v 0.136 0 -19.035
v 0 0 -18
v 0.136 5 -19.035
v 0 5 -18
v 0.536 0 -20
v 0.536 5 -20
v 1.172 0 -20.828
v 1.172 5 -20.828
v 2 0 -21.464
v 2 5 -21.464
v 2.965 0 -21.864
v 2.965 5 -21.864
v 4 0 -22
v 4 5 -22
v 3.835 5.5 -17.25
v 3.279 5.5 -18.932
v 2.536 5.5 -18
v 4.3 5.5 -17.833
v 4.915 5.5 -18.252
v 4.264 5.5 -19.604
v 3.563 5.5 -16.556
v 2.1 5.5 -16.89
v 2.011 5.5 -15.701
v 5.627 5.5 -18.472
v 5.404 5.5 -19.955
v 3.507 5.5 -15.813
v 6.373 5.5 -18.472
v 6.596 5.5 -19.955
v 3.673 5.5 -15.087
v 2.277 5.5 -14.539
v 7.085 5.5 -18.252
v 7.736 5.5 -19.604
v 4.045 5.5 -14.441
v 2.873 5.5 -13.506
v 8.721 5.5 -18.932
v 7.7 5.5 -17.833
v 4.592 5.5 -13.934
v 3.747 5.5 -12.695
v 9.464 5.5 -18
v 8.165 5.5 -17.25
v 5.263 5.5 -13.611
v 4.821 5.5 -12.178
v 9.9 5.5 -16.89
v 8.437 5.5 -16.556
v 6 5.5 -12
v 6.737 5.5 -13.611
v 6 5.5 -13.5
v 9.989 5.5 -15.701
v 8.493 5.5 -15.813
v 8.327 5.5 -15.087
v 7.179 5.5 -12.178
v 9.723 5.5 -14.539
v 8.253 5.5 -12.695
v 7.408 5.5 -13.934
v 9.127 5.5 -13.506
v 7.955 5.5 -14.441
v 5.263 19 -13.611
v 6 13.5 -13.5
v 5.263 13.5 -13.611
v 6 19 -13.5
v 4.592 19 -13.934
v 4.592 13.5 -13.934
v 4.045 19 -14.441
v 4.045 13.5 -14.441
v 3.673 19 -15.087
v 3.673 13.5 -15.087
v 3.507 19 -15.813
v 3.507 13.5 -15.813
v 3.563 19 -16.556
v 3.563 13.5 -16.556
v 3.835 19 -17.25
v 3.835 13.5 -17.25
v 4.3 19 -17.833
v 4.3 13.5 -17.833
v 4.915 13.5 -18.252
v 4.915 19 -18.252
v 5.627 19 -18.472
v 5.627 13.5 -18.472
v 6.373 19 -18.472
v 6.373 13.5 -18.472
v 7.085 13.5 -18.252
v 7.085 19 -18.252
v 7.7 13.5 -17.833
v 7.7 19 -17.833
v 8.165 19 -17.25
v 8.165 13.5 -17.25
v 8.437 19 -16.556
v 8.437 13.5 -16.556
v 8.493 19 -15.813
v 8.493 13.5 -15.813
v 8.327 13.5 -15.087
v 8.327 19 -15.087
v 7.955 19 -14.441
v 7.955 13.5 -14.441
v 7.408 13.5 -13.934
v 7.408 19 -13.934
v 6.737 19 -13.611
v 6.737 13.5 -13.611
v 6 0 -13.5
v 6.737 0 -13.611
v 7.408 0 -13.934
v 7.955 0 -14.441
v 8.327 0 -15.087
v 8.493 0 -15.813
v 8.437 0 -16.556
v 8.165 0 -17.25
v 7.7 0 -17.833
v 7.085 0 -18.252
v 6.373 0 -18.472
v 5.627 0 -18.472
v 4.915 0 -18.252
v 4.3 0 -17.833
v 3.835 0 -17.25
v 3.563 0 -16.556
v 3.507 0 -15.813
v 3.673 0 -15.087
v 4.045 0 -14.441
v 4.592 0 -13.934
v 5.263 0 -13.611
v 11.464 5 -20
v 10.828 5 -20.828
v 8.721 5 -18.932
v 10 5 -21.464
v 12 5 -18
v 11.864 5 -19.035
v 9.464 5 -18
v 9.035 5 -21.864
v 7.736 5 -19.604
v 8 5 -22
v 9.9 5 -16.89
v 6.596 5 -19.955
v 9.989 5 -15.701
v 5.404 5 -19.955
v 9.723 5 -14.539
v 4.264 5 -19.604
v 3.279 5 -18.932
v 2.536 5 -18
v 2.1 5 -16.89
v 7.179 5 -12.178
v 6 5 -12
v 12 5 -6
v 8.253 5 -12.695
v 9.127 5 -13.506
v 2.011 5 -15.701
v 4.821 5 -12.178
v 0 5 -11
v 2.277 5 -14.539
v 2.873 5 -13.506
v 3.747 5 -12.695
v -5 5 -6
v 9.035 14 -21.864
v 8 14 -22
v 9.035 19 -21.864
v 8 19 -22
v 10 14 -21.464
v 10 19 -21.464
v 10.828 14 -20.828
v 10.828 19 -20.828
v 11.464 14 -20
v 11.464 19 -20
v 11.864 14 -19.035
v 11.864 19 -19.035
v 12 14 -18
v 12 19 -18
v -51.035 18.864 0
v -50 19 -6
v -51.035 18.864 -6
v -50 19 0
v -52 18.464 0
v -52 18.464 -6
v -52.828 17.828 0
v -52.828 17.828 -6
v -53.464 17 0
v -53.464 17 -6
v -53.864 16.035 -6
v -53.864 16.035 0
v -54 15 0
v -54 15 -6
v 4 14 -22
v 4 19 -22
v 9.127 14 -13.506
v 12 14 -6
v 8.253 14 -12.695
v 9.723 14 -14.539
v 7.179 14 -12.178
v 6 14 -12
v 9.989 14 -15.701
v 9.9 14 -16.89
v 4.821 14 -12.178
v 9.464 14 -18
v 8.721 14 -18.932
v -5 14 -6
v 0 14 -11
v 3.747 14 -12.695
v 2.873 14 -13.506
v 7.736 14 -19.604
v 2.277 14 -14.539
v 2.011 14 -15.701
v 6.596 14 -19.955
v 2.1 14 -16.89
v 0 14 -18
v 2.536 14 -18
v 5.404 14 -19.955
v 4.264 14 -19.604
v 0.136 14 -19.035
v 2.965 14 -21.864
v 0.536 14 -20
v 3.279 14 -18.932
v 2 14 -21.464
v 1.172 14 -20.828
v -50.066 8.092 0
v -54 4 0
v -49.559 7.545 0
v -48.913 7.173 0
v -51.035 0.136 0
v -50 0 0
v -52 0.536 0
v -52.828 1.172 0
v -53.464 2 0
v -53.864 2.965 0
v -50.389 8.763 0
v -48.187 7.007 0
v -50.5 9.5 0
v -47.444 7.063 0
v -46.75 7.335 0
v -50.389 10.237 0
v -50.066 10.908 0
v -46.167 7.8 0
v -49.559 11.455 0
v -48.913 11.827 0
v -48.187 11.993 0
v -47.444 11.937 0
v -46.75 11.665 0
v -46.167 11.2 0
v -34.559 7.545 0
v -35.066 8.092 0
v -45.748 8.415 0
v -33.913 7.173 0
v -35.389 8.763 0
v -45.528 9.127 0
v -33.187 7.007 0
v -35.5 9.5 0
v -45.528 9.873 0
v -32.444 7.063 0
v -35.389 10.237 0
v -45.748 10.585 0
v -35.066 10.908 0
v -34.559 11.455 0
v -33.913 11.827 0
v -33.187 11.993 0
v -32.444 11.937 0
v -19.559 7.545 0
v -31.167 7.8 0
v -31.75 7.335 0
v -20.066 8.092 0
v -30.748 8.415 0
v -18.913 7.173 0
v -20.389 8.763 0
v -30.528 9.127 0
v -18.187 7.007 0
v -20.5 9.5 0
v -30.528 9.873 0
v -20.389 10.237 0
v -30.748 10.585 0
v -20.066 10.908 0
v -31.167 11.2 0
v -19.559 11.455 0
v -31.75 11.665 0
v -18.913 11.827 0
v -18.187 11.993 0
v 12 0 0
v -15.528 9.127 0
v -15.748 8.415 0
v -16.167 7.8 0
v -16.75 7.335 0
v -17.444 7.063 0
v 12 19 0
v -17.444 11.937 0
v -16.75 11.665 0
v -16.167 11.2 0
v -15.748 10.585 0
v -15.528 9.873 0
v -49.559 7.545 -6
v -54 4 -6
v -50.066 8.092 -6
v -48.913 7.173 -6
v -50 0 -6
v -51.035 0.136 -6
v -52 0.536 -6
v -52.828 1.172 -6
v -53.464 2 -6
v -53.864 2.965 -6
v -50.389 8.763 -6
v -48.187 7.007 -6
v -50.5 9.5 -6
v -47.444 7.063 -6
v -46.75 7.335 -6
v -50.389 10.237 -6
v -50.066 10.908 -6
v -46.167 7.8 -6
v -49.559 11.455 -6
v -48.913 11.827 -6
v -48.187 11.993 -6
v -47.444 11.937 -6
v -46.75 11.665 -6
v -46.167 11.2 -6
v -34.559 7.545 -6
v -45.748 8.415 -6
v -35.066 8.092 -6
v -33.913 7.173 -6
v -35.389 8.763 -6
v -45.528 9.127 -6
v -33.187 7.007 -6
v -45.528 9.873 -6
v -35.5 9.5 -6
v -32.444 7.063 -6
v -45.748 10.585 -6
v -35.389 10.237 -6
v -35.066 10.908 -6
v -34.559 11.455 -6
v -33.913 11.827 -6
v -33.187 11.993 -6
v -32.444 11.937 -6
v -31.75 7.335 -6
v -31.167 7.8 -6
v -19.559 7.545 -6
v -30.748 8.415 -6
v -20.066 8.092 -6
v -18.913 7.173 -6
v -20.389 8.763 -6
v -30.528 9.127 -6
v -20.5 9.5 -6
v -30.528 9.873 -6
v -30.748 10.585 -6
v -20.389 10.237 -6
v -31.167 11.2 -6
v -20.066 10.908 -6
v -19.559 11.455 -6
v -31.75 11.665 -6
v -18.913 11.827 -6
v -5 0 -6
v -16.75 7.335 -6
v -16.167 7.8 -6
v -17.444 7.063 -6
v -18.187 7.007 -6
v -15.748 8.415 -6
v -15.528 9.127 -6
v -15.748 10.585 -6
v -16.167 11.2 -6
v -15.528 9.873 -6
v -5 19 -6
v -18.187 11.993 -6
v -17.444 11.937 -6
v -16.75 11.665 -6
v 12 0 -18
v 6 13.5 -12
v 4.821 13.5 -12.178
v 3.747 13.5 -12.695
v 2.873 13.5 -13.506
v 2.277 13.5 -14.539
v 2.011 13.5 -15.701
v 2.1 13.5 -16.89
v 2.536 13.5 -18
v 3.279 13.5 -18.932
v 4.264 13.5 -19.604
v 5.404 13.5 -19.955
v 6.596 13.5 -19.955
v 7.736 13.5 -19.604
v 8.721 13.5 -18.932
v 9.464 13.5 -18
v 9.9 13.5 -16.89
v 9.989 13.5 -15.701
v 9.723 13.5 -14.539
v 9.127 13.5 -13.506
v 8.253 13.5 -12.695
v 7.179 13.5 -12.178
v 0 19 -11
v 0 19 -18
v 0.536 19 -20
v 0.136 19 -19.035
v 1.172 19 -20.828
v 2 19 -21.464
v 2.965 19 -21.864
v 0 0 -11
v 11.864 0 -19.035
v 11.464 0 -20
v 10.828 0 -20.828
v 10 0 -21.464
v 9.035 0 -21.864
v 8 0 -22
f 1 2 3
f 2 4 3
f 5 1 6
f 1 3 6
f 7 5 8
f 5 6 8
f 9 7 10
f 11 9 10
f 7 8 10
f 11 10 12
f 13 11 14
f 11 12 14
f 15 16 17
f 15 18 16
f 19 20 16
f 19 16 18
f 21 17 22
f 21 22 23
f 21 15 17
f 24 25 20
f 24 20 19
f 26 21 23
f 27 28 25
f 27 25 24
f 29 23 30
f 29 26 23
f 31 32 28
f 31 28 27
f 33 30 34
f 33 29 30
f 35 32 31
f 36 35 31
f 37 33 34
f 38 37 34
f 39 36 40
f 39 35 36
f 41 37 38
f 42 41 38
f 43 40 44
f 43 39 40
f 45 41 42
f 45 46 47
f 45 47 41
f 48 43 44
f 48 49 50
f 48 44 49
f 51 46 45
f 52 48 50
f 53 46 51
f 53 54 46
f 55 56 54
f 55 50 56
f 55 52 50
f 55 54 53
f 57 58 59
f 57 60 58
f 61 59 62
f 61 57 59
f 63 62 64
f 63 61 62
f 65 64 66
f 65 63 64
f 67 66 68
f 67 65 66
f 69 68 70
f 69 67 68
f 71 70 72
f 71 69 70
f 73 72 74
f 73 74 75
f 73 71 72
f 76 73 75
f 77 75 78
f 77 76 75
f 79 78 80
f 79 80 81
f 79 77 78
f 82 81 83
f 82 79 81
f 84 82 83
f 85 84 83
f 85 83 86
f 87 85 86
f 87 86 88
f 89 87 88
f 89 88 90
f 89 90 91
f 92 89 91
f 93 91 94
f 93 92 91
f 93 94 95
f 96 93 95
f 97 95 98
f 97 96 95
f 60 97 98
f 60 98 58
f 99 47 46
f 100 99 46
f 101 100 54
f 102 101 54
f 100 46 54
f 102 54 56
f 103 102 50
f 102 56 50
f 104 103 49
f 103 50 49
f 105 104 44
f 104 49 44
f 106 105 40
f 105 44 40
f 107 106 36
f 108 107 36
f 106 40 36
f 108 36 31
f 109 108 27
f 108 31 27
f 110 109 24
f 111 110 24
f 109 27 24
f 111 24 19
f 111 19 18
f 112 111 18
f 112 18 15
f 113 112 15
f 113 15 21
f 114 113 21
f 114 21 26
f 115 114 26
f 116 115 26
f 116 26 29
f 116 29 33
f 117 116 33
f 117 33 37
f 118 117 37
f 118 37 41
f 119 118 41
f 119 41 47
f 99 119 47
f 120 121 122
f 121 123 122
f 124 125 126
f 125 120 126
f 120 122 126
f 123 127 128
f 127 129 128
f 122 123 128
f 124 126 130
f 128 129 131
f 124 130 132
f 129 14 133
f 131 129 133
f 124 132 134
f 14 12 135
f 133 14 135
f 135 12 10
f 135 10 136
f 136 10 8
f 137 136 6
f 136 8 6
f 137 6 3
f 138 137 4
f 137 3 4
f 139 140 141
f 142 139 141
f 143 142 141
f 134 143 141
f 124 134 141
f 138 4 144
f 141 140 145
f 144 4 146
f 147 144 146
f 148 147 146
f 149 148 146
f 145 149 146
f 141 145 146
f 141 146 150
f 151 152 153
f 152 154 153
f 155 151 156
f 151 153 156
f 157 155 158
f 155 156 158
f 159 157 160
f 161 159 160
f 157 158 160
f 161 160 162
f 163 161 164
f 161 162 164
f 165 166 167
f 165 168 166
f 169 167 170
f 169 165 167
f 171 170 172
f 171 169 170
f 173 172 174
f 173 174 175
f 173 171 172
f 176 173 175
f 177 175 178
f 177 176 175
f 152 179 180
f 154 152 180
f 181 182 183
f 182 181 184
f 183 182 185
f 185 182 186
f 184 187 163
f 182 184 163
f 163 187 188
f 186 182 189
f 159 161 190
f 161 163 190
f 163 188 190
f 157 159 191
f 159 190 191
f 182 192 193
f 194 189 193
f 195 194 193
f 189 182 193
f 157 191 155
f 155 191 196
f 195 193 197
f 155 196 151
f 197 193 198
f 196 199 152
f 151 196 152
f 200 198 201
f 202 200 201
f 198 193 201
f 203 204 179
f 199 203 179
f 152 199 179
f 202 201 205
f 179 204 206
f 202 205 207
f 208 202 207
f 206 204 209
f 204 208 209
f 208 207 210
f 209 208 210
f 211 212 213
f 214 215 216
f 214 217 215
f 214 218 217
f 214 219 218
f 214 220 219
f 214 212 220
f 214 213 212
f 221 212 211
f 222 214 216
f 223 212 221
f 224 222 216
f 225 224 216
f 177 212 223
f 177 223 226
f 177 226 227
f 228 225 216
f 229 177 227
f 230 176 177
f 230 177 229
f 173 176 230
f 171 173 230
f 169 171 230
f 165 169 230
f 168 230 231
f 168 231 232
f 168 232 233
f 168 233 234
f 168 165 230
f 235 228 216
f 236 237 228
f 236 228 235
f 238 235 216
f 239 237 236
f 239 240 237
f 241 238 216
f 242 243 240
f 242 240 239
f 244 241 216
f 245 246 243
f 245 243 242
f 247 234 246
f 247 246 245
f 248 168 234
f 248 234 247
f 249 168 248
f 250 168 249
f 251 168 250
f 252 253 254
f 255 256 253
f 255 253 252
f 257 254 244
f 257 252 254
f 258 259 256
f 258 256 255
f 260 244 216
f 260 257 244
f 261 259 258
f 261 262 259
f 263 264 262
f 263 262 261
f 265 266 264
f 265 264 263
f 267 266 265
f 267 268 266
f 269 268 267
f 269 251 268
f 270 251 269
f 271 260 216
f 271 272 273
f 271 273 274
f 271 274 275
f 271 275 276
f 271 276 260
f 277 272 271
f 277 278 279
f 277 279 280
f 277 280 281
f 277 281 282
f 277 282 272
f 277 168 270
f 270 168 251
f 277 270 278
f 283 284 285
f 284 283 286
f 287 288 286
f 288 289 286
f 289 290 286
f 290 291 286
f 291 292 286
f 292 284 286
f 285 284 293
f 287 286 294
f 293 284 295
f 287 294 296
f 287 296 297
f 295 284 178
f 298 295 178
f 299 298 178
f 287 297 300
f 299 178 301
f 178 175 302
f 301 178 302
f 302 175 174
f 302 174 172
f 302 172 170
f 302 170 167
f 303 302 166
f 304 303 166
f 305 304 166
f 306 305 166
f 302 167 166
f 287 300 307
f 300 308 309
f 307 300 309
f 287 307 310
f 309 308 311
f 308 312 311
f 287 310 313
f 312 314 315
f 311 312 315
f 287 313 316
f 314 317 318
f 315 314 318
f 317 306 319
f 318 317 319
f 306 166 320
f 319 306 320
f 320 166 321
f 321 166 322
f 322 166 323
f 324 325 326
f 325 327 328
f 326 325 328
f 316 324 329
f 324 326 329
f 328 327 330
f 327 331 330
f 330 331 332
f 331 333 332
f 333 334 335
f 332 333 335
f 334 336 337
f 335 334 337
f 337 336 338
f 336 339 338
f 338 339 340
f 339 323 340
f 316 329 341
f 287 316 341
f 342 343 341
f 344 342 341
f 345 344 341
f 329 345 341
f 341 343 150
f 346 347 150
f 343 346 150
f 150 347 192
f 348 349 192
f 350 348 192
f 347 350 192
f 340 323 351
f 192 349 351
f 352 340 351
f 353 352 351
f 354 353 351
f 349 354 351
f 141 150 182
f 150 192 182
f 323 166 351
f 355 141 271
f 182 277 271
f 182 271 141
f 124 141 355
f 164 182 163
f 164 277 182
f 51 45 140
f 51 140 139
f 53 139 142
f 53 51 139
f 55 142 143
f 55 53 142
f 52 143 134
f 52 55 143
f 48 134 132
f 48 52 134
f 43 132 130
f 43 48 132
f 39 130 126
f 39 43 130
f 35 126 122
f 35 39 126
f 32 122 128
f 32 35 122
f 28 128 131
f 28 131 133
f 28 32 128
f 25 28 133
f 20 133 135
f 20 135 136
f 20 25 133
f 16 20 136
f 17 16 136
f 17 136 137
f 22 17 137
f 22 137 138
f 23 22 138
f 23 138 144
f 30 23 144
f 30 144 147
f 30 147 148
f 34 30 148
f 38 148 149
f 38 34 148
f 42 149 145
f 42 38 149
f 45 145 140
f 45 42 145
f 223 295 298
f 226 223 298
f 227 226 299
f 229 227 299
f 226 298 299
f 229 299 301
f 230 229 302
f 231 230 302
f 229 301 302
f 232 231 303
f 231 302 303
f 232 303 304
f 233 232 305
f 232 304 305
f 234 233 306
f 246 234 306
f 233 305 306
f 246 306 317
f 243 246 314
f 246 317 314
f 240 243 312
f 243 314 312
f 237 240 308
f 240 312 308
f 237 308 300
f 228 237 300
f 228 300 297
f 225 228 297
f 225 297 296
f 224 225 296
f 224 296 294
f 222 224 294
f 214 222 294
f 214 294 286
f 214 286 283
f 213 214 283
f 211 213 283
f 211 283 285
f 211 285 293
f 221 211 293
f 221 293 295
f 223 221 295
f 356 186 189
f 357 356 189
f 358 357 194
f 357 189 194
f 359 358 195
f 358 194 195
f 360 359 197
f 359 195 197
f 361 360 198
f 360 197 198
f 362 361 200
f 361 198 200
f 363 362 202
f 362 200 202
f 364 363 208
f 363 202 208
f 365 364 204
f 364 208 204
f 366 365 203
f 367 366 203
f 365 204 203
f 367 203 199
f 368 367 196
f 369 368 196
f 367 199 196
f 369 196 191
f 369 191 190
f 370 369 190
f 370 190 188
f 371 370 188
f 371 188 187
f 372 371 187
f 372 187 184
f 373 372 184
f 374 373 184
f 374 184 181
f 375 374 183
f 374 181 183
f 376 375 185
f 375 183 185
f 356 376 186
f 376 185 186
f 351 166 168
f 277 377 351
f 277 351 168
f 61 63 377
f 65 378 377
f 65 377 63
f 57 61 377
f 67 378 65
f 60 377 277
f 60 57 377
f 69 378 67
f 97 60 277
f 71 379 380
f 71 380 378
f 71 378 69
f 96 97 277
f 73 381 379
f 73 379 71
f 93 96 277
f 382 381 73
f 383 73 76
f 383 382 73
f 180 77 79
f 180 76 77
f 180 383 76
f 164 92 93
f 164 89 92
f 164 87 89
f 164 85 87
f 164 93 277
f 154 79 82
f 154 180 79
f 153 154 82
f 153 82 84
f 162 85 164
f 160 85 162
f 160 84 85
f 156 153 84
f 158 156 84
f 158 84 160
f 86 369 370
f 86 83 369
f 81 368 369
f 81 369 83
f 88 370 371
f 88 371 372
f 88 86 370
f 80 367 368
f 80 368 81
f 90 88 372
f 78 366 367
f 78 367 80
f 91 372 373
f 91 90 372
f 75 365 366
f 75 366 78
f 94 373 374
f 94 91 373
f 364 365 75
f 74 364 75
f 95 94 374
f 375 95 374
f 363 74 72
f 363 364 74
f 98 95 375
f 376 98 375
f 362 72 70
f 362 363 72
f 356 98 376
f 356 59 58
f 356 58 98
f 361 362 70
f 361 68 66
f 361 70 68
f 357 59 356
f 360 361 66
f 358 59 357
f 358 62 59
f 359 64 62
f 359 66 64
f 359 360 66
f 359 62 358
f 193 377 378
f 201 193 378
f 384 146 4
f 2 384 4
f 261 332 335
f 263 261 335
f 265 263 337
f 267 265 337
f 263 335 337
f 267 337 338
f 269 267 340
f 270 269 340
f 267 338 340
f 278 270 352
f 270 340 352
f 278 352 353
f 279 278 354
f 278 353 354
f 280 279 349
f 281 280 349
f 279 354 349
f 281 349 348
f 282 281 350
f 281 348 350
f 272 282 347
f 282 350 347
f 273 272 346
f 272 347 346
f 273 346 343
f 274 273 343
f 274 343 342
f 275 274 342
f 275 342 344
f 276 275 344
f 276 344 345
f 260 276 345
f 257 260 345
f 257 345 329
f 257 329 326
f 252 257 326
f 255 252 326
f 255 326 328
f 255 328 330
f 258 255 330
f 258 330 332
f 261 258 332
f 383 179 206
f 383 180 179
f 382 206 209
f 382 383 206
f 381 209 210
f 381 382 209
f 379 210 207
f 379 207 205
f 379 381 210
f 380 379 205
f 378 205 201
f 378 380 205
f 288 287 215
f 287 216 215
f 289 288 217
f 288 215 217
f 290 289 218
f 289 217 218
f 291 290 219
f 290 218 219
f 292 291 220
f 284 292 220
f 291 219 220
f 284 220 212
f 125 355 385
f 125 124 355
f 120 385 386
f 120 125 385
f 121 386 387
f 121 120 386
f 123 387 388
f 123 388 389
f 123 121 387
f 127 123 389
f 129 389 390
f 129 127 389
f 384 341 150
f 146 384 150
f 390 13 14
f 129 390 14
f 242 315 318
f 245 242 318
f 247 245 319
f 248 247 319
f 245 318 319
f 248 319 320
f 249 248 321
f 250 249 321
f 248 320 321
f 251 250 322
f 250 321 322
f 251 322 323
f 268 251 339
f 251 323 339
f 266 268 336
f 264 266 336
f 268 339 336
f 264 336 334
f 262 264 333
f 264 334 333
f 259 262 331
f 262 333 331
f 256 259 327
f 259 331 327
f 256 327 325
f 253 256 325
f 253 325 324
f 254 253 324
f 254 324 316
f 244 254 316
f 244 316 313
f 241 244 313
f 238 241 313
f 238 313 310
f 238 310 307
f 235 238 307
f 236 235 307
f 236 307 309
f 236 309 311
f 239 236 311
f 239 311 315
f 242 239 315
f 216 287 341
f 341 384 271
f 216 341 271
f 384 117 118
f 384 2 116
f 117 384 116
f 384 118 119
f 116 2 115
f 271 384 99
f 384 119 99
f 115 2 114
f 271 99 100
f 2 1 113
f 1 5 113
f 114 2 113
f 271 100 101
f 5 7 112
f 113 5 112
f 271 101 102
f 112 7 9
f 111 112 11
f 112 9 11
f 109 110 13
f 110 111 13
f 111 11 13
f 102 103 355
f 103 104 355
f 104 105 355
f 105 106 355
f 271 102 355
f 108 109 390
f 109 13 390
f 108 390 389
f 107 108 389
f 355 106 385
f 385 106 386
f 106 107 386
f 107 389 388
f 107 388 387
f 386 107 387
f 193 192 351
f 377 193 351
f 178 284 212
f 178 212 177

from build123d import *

# Parameters (mm, degrees)
EXTRUDE_1_DEPTH     = 12
SKETCH_2_R          = 2.5
CUT_EXTRUDE_1_DEPTH = 32.448370387
SKETCH_3_R          = 4
SKETCH_3_R_2        = 2.5
EXTRUDE_2_DEPTH     = 0.5
EXTRUDE_START       = 0.5
SKETCH_4_R          = 4
SKETCH_4_R_2        = 2.5
EXTRUDE_3_DEPTH     = 0.5
FILLET_1_R          = 4
EXTRUDE_START_2     = -6
SKETCH_5_W          = 54
SKETCH_5_H          = 19
EXTRUDE_4_DEPTH     = 6
CHAMFER_1_SIZE      = 5
SKETCH_6_R          = 2.5
CUT_EXTRUDE_2_DEPTH = 60.439044407
FILLET_2_R          = 4


with BuildPart() as part:
    # Эскиз1 → Бобышка-Вытянуть1 (new body)
    with BuildSketch(Plane(origin=(0, 0, 0), x_dir=(0, 0, -1), z_dir=(1, 0, 0))):
        Polygon((0, 0), (22, 0), (22, 5), (6, 5), (6, 14), (22, 14), (22, 19), (0, 19), align=None)
    extrude(amount=EXTRUDE_1_DEPTH)

    # Эскиз2 → Вырез-Вытянуть1 (cut, through all)
    with BuildSketch(Plane(origin=(0, 19, 0), x_dir=(1, 0, 0), z_dir=(0, 1, 0))):
        with Locations(Location((6, 16, 0), (0, 0, 270))):
            Circle(SKETCH_2_R)
    extrude(amount=-CUT_EXTRUDE_1_DEPTH, mode=Mode.SUBTRACT)

    # Эскиз3 → Бобышка-Вытянуть2 (add)
    with BuildSketch(Plane.XZ.offset(-14)):
        with Locations(Location((6, -16, 0), (0, 0, 90))):
            Circle(SKETCH_3_R)
        with Locations(Location((6, -16, 0), (0, 0, 90))):
            Circle(SKETCH_3_R_2, mode=Mode.SUBTRACT)
    extrude(amount=EXTRUDE_2_DEPTH)

    # Эскиз4 → Бобышка-Вытянуть3 (add)
    with BuildSketch(Plane(origin=(0, 5, 0), x_dir=(1, 0, 0), z_dir=(0, 1, 0)).offset(EXTRUDE_START)):
        with Locations(Location((6, 16, 0), (0, 0, 270))):
            Circle(SKETCH_4_R)
        with Locations(Location((6, 16, 0), (0, 0, 270))):
            Circle(SKETCH_4_R_2, mode=Mode.SUBTRACT)
    extrude(amount=-EXTRUDE_3_DEPTH)

    # Скругление1
    fillet_1_edges = [part.edges().sort_by_distance(p)[0] for p in [
        (12, 2.5, -22),
        (12, 16.5, -22),
        (0, 16.5, -22),
        (0, 2.5, -22),
    ]]
    fillet(fillet_1_edges, radius=FILLET_1_R)

    # Эскиз5 → Бобышка-Вытянуть4 (add)
    with BuildSketch(Plane.XY.offset(EXTRUDE_START_2)):
        with Locations((-27, 9.5)):
            Rectangle(SKETCH_5_W, SKETCH_5_H)
    extrude(amount=EXTRUDE_4_DEPTH)

    # Фаска1
    chamfer_1_edges = [part.edges().sort_by_distance(p)[0] for p in [
        (0, 16.5, -6),
        (0, 2.5, -6),
    ]]
    chamfer(chamfer_1_edges, length=CHAMFER_1_SIZE)

    # Эскиз6 → Вырез-Вытянуть2 (cut, through all)
    with BuildSketch(Plane(origin=(0, 0, -6), x_dir=(-1, 0, 0), z_dir=(0, 0, -1))):
        with Locations((48, 9.5)):
            Circle(SKETCH_6_R)
        with Locations((33, 9.5)):
            Circle(SKETCH_6_R)
        with Locations((18, 9.5)):
            Circle(SKETCH_6_R)
    extrude(amount=-CUT_EXTRUDE_2_DEPTH, mode=Mode.SUBTRACT)

    # Скругление2
    fillet_2_edges = [part.edges().sort_by_distance(p)[0] for p in [
        (-54, 0, -3),
        (-54, 19, -3),
    ]]
    fillet(fillet_2_edges, radius=FILLET_2_R)


solid = part.part
